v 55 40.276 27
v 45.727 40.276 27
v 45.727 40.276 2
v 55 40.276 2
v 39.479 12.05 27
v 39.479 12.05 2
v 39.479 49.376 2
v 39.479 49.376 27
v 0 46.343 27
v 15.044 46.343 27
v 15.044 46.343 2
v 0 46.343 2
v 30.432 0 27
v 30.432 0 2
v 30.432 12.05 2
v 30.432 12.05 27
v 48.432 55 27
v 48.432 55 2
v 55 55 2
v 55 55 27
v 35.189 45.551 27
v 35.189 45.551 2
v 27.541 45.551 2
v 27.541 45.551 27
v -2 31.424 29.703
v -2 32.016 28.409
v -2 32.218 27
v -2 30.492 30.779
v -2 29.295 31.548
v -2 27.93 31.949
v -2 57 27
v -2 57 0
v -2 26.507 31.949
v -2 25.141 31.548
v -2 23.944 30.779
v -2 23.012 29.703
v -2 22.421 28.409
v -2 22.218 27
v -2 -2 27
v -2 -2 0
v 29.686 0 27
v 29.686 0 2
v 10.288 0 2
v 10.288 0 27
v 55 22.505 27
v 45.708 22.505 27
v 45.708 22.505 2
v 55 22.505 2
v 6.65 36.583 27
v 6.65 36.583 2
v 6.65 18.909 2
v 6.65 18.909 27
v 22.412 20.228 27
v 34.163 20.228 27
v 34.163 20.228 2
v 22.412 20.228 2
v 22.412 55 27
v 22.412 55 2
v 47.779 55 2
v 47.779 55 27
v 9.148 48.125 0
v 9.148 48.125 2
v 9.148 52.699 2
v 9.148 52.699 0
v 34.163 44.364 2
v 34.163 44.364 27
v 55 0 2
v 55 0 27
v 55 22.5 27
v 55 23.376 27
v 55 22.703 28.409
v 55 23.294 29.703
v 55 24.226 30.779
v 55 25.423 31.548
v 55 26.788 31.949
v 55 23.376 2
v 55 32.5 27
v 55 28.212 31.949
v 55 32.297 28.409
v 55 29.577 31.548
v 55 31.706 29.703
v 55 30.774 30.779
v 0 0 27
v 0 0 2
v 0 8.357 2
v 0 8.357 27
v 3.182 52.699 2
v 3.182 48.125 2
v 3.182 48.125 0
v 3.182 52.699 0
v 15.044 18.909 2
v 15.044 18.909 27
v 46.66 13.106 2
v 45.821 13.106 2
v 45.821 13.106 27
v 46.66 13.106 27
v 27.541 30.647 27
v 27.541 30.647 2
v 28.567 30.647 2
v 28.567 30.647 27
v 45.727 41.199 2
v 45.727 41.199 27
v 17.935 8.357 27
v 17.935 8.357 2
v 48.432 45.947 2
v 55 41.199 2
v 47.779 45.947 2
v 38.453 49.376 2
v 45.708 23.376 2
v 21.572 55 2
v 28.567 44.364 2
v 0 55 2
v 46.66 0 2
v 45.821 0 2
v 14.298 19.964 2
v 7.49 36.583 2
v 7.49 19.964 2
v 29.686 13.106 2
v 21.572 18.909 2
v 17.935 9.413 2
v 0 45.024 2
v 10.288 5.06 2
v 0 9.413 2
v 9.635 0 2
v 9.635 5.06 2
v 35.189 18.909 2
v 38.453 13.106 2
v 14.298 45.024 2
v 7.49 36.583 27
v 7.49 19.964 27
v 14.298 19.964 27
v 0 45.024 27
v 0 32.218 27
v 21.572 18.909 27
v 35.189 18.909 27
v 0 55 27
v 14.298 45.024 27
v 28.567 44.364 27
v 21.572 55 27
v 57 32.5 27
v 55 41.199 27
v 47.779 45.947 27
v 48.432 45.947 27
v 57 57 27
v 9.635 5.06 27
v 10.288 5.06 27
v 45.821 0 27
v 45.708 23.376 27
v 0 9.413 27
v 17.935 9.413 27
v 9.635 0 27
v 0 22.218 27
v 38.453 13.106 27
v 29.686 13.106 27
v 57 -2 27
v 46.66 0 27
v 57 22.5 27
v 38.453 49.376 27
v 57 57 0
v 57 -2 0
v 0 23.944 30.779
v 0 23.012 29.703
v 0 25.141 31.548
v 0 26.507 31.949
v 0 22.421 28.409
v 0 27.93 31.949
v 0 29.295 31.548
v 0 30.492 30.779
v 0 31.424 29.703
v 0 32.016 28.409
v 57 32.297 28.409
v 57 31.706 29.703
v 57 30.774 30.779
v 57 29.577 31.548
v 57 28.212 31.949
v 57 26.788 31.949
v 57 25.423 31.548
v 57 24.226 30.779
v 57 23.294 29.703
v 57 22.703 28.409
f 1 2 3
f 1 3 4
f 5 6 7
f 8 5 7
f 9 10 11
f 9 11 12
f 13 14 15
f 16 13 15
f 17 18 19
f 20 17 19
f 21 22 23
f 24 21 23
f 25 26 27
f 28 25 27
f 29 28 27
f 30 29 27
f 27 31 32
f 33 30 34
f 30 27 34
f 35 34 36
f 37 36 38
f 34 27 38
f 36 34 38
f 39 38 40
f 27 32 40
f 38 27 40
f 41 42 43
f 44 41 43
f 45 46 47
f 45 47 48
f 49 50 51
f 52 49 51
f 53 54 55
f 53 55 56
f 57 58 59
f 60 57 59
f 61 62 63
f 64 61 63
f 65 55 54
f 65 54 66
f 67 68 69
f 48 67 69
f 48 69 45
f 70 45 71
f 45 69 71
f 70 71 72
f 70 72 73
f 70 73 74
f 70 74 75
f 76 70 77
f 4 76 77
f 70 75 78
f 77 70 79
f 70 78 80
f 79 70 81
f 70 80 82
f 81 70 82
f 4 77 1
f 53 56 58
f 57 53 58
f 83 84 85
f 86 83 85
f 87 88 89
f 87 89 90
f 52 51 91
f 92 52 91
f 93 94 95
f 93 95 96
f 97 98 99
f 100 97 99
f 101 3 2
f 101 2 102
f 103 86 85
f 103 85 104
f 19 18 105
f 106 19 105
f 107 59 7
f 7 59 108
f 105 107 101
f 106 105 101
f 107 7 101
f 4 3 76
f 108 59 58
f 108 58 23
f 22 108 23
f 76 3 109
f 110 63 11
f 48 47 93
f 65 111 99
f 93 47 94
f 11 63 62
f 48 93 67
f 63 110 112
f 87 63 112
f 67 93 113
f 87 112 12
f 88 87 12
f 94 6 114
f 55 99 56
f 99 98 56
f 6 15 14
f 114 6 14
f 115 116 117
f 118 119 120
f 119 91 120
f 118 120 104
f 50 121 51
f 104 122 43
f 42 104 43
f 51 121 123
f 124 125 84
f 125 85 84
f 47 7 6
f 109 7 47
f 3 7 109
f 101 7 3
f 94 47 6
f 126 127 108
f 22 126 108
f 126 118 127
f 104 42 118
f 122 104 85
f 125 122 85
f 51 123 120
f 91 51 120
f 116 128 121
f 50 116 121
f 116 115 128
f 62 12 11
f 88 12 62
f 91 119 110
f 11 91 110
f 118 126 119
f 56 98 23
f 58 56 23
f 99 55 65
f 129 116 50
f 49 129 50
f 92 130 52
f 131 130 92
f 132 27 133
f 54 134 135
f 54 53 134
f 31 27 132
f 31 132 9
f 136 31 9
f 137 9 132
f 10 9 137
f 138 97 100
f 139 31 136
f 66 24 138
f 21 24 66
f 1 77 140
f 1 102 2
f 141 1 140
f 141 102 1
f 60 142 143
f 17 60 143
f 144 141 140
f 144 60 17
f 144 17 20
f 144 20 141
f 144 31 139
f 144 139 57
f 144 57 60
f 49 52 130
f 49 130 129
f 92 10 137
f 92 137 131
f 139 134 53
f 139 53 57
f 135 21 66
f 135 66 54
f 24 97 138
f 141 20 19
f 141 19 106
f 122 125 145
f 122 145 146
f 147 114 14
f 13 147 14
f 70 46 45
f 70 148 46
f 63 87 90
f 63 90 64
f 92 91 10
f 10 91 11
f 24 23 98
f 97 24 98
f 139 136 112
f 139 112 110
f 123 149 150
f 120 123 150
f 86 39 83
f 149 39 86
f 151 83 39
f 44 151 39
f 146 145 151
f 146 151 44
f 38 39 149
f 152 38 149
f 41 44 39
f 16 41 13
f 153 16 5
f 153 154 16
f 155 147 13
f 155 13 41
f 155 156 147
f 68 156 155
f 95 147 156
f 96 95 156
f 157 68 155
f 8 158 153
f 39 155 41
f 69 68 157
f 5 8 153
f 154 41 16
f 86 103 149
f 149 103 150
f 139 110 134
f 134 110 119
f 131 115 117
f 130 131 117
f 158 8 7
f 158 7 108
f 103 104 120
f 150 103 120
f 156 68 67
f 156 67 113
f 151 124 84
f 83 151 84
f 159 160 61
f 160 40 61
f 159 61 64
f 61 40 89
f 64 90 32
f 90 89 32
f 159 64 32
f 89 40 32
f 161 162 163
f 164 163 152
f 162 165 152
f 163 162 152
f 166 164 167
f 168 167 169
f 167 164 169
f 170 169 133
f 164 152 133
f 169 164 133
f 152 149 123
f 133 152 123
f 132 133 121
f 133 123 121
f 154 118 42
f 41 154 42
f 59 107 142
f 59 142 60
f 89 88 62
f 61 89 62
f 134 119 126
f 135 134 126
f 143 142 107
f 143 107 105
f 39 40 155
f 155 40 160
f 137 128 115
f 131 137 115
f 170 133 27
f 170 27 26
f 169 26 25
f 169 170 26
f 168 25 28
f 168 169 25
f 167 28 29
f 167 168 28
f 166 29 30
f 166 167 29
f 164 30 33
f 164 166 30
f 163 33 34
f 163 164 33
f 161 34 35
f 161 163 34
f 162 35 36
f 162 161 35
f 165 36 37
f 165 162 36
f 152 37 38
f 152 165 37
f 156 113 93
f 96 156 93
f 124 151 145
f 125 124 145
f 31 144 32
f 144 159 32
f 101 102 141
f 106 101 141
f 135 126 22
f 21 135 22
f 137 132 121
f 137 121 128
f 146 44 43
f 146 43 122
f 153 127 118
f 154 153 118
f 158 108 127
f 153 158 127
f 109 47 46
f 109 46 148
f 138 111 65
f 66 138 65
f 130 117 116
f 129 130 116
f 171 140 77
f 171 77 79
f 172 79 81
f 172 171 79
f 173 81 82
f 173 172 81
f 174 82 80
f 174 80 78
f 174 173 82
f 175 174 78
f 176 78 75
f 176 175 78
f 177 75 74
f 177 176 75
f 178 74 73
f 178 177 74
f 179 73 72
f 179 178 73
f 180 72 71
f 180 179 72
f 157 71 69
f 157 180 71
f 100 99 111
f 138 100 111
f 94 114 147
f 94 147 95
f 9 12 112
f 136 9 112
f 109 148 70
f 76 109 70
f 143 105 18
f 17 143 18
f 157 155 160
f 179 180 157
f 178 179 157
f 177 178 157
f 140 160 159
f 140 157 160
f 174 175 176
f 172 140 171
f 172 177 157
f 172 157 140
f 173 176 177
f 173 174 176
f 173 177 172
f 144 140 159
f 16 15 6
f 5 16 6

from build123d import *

# Parameters (mm, degrees)
F0_W      = 55
F0_H      = 55
F1_DEPTH  = 2
F2_W      = 0.8393637836
F2_H      = 13.1056420505
F2_W_2    = 14.2980124801
F2_H_2    = 1.318924129
F2_W_3    = 17.9352443665
F2_H_3    = 1.0551437736
F2_W_4    = 0.6528366357
F2_H_4    = 5.0601772964
F2_W_5    = 1.0258853436
F2_H_5    = 24.1364017129
F2_W_6    = 0.7460992783
F2_H_6    = 12.0504982769
F2_W_7    = 8.0205630511
F2_W_8    = 9.2725682259
F2_H_7    = 0.9232535958
F2_W_9    = 0.6528384984
F2_H_8    = 9.0530256927
F2_W_10   = 9.2923234403
F2_H_9    = 0.8714348078
F3_DEPTH  = 25
F5_DEPTH  = 2
F7_DEPTH  = 25
F8_W      = 57
F8_H      = 2
F9_DEPTH  = 2
F10_W     = 2
F10_H     = 57
F11_DEPTH = 25
F13_DEPTH = 2
F15_DEPTH = 25
F17_DEPTH = 2
F19_DEPTH = 25
F20_W     = 5.9659110848
F20_H     = 4.5738629997
F21_DEPTH = 25
F24_DEPTH = 2
F26_DEPTH = 2


with BuildPart() as f1:
    # F0 (on Top) → F1 (new body)
    with BuildSketch(Plane.XY):
        with Locations((27.5, 27.5)):
            Rectangle(F0_W, F0_H)
    extrude(amount=F1_DEPTH)

    # F2 (on face) → F3 (join)
    with BuildSketch(Plane.XY.offset(2)):
        with Locations((46.2403725833, 6.5528210253)):
            Rectangle(F2_W, F2_H)
        with Locations((7.1490062401, 45.6831902266)):
            Rectangle(F2_W_2, F2_H_2)
        Polygon((15.0441108271, 46.3426522911), (14.2980124801, 46.3426522911), (14.2980124801, 45.0237281621), (14.2980124801, 19.9640728533), (15.0441108271, 19.9640728533), align=None)
        Polygon((15.0441108271, 19.9640728533), (14.2980124801, 19.9640728533), (7.4898591265, 19.9640728533), (7.4898591265, 18.9089290798), (15.0441108271, 18.9089290798), align=None)
        Polygon((7.4898591265, 18.9089290798), (7.4898591265, 19.9640728533), (7.4898591265, 36.5825779736), (6.6504976712, 36.5825779736), (6.6504976712, 18.9089290798), align=None)
        with Locations((8.9676221833, 8.8850706816)):
            Rectangle(F2_W_3, F2_H_3)
        with Locations((9.9613117054, 2.5300886482)):
            Rectangle(F2_W_4, F2_H_4)
        Polygon((22.4118363112, 55), (21.5724762529, 55), (21.5724762529, 18.9089290798), (22.4118363112, 18.9089290798), (22.4118363112, 20.2278606594), align=None)
        Polygon((34.1628938913, 20.2278606594), (22.4118363112, 20.2278606594), (22.4118363112, 18.9089290798), (35.1887792349, 18.9089290798), (35.1887792349, 20.2278606594), align=None)
        with Locations((34.6758365631, 32.2960615158)):
            Rectangle(F2_W_5, F2_H_5)
        Polygon((28.5671520978, 44.3642623723), (34.1628938913, 44.3642623723), (35.1887792349, 44.3642623723), (35.1887792349, 45.5512963235), (28.5671520978, 45.5512963235), align=None)
        Polygon((28.5671520978, 30.6474007666), (28.5671520978, 44.3642623723), (28.5671520978, 45.5512963235), (27.5412686169, 45.5512963235), (27.5412686169, 30.6474007666), align=None)
        with Locations((30.0593515858, 6.0252491385)):
            Rectangle(F2_W_6, F2_H_6)
        with Locations((30.0593515858, 12.5780701637)):
            Rectangle(F2_W_6, F2_H_3)
        with Locations((34.4426827505, 12.5780701637)):
            Rectangle(F2_W_7, F2_H_3)
        Polygon((38.4529642761, 13.1056420505), (38.4529642761, 12.0504982769), (39.4788496196, 12.0504982769), (39.4788496196, 49.376193434), (38.4529642761, 49.376193434), align=None)
        with Locations((50.3637158871, 40.7372042537)):
            Rectangle(F2_W_8, F2_H_7)
        with Locations((48.1056179851, 50.4734871536)):
            Rectangle(F2_W_9, F2_H_8)
        with Locations((50.3538382798, 22.9402892292)):
            Rectangle(F2_W_10, F2_H_9)
    extrude(amount=F3_DEPTH)

    # F4 (on face) → F5 (join)
    with BuildSketch(Plane.XZ):
        Polygon((9.6348933876, 2), (0, 2), (0, 0), (55, 0), (55, 2), (46.6600544751, 2), (45.8206906915, 2), (30.432401225, 2), (29.6863019466, 2), (10.2877300233, 2), align=None)
    extrude(amount=F5_DEPTH)

    # F6 (on face) → F7 (join)
    with BuildSketch(Plane.XY.offset(2)):
        Polygon((9.6348933876, 0), (0, 0), (0, -2), (55, -2), (55, 0), (46.6600544751, 0), (45.8206906915, 0), (30.432401225, 0), (29.6863019466, 0), (10.2877300233, 0), align=None)
    extrude(amount=F7_DEPTH)

    # F8 (on face) → F9 (join)
    with BuildSketch(Plane(origin=(0, 0, 0), x_dir=(0, -1, 0), z_dir=(-1, 0, 0))):
        with Locations((-26.5, 1)):
            Rectangle(F8_W, F8_H)
    extrude(amount=F9_DEPTH)

    # F10 (on face) → F11 (join)
    with BuildSketch(Plane.XY.offset(2)):
        with Locations((-1, 26.5)):
            Rectangle(F10_W, F10_H)
    extrude(amount=F11_DEPTH)

    # F12 (on face) → F13 (join)
    with BuildSketch(Plane(origin=(0, 55, 0), x_dir=(-1, 0, 0), z_dir=(0, 1, 0))):
        Polygon((-55, 0), (2, 0), (2, 2), (0, 2), (-21.5724762529, 2), (-22.4118363112, 2), (-47.779198736, 2), (-48.4320372343, 2), (-55, 2), align=None)
    extrude(amount=F13_DEPTH)

    # F14 (on face) → F15 (join)
    with BuildSketch(Plane.XY.offset(2)):
        Polygon((55, 55), (55, 57), (-2, 57), (-2, 55), (0, 55), (21.5724762529, 55), (22.4118363112, 55), (47.779198736, 55), (48.4320372343, 55), align=None)
    extrude(amount=F15_DEPTH)

    # F16 (on face) → F17 (join)
    with BuildSketch(Plane.YZ.offset(55)):
        Polygon((-2, 2), (-2, 0), (57, 0), (57, 2), (55, 2), (41.1988310516, 2), (40.2755774558, 2), (23.376006633, 2), (22.5045718253, 2), (0, 2), align=None)
    extrude(amount=F17_DEPTH)

    # F18 (on face) → F19 (join)
    with BuildSketch(Plane.XY.offset(2)):
        Polygon((57, -2), (57, 57), (55, 57), (55, 55), (55, 41.1988310516), (55, 40.2755774558), (55, 23.376006633), (55, 22.5045718253), (55, 0), (55, -2), align=None)
    extrude(amount=F19_DEPTH)

    # F20 (on face) → F21 (cut)
    with BuildSketch(Plane.XY.offset(2)):
        with Locations((6.1647732509, 50.411934033)):
            Rectangle(F20_W, F20_H)
    extrude(amount=-F21_DEPTH, mode=Mode.SUBTRACT)

    # F23 (on face) → F24 (join, through all)
    with BuildSketch(Plane.YZ.offset(57)):
        with BuildLine():
            Line((22.5, 27), (32.5, 27))
            ThreePointArc((32.5, 27), (27.5, 32), (22.5, 27))
        make_face()
        with BuildLine():
            Line((57, 27), (32.5, 27))
            ThreePointArc((32.5, 27), (27.5, 22), (22.5, 27))
            Line((22.5, 27), (-2, 27))
            Line((-2, 27), (-2, 0))
            Line((-2, 0), (57, 0))
            Line((57, 0), (57, 27))
        make_face()
    extrude(amount=-F24_DEPTH)

    # F25 (on face) → F26 (join, through all)
    with BuildSketch(Plane.YZ):
        with BuildLine():
            Line((22.2181853652, 27), (32.2181853652, 27))
            ThreePointArc((32.2181853652, 27), (27.2181853652, 32), (22.2181853652, 27))
        make_face()
    extrude(amount=-F26_DEPTH)


solid = f1.part
